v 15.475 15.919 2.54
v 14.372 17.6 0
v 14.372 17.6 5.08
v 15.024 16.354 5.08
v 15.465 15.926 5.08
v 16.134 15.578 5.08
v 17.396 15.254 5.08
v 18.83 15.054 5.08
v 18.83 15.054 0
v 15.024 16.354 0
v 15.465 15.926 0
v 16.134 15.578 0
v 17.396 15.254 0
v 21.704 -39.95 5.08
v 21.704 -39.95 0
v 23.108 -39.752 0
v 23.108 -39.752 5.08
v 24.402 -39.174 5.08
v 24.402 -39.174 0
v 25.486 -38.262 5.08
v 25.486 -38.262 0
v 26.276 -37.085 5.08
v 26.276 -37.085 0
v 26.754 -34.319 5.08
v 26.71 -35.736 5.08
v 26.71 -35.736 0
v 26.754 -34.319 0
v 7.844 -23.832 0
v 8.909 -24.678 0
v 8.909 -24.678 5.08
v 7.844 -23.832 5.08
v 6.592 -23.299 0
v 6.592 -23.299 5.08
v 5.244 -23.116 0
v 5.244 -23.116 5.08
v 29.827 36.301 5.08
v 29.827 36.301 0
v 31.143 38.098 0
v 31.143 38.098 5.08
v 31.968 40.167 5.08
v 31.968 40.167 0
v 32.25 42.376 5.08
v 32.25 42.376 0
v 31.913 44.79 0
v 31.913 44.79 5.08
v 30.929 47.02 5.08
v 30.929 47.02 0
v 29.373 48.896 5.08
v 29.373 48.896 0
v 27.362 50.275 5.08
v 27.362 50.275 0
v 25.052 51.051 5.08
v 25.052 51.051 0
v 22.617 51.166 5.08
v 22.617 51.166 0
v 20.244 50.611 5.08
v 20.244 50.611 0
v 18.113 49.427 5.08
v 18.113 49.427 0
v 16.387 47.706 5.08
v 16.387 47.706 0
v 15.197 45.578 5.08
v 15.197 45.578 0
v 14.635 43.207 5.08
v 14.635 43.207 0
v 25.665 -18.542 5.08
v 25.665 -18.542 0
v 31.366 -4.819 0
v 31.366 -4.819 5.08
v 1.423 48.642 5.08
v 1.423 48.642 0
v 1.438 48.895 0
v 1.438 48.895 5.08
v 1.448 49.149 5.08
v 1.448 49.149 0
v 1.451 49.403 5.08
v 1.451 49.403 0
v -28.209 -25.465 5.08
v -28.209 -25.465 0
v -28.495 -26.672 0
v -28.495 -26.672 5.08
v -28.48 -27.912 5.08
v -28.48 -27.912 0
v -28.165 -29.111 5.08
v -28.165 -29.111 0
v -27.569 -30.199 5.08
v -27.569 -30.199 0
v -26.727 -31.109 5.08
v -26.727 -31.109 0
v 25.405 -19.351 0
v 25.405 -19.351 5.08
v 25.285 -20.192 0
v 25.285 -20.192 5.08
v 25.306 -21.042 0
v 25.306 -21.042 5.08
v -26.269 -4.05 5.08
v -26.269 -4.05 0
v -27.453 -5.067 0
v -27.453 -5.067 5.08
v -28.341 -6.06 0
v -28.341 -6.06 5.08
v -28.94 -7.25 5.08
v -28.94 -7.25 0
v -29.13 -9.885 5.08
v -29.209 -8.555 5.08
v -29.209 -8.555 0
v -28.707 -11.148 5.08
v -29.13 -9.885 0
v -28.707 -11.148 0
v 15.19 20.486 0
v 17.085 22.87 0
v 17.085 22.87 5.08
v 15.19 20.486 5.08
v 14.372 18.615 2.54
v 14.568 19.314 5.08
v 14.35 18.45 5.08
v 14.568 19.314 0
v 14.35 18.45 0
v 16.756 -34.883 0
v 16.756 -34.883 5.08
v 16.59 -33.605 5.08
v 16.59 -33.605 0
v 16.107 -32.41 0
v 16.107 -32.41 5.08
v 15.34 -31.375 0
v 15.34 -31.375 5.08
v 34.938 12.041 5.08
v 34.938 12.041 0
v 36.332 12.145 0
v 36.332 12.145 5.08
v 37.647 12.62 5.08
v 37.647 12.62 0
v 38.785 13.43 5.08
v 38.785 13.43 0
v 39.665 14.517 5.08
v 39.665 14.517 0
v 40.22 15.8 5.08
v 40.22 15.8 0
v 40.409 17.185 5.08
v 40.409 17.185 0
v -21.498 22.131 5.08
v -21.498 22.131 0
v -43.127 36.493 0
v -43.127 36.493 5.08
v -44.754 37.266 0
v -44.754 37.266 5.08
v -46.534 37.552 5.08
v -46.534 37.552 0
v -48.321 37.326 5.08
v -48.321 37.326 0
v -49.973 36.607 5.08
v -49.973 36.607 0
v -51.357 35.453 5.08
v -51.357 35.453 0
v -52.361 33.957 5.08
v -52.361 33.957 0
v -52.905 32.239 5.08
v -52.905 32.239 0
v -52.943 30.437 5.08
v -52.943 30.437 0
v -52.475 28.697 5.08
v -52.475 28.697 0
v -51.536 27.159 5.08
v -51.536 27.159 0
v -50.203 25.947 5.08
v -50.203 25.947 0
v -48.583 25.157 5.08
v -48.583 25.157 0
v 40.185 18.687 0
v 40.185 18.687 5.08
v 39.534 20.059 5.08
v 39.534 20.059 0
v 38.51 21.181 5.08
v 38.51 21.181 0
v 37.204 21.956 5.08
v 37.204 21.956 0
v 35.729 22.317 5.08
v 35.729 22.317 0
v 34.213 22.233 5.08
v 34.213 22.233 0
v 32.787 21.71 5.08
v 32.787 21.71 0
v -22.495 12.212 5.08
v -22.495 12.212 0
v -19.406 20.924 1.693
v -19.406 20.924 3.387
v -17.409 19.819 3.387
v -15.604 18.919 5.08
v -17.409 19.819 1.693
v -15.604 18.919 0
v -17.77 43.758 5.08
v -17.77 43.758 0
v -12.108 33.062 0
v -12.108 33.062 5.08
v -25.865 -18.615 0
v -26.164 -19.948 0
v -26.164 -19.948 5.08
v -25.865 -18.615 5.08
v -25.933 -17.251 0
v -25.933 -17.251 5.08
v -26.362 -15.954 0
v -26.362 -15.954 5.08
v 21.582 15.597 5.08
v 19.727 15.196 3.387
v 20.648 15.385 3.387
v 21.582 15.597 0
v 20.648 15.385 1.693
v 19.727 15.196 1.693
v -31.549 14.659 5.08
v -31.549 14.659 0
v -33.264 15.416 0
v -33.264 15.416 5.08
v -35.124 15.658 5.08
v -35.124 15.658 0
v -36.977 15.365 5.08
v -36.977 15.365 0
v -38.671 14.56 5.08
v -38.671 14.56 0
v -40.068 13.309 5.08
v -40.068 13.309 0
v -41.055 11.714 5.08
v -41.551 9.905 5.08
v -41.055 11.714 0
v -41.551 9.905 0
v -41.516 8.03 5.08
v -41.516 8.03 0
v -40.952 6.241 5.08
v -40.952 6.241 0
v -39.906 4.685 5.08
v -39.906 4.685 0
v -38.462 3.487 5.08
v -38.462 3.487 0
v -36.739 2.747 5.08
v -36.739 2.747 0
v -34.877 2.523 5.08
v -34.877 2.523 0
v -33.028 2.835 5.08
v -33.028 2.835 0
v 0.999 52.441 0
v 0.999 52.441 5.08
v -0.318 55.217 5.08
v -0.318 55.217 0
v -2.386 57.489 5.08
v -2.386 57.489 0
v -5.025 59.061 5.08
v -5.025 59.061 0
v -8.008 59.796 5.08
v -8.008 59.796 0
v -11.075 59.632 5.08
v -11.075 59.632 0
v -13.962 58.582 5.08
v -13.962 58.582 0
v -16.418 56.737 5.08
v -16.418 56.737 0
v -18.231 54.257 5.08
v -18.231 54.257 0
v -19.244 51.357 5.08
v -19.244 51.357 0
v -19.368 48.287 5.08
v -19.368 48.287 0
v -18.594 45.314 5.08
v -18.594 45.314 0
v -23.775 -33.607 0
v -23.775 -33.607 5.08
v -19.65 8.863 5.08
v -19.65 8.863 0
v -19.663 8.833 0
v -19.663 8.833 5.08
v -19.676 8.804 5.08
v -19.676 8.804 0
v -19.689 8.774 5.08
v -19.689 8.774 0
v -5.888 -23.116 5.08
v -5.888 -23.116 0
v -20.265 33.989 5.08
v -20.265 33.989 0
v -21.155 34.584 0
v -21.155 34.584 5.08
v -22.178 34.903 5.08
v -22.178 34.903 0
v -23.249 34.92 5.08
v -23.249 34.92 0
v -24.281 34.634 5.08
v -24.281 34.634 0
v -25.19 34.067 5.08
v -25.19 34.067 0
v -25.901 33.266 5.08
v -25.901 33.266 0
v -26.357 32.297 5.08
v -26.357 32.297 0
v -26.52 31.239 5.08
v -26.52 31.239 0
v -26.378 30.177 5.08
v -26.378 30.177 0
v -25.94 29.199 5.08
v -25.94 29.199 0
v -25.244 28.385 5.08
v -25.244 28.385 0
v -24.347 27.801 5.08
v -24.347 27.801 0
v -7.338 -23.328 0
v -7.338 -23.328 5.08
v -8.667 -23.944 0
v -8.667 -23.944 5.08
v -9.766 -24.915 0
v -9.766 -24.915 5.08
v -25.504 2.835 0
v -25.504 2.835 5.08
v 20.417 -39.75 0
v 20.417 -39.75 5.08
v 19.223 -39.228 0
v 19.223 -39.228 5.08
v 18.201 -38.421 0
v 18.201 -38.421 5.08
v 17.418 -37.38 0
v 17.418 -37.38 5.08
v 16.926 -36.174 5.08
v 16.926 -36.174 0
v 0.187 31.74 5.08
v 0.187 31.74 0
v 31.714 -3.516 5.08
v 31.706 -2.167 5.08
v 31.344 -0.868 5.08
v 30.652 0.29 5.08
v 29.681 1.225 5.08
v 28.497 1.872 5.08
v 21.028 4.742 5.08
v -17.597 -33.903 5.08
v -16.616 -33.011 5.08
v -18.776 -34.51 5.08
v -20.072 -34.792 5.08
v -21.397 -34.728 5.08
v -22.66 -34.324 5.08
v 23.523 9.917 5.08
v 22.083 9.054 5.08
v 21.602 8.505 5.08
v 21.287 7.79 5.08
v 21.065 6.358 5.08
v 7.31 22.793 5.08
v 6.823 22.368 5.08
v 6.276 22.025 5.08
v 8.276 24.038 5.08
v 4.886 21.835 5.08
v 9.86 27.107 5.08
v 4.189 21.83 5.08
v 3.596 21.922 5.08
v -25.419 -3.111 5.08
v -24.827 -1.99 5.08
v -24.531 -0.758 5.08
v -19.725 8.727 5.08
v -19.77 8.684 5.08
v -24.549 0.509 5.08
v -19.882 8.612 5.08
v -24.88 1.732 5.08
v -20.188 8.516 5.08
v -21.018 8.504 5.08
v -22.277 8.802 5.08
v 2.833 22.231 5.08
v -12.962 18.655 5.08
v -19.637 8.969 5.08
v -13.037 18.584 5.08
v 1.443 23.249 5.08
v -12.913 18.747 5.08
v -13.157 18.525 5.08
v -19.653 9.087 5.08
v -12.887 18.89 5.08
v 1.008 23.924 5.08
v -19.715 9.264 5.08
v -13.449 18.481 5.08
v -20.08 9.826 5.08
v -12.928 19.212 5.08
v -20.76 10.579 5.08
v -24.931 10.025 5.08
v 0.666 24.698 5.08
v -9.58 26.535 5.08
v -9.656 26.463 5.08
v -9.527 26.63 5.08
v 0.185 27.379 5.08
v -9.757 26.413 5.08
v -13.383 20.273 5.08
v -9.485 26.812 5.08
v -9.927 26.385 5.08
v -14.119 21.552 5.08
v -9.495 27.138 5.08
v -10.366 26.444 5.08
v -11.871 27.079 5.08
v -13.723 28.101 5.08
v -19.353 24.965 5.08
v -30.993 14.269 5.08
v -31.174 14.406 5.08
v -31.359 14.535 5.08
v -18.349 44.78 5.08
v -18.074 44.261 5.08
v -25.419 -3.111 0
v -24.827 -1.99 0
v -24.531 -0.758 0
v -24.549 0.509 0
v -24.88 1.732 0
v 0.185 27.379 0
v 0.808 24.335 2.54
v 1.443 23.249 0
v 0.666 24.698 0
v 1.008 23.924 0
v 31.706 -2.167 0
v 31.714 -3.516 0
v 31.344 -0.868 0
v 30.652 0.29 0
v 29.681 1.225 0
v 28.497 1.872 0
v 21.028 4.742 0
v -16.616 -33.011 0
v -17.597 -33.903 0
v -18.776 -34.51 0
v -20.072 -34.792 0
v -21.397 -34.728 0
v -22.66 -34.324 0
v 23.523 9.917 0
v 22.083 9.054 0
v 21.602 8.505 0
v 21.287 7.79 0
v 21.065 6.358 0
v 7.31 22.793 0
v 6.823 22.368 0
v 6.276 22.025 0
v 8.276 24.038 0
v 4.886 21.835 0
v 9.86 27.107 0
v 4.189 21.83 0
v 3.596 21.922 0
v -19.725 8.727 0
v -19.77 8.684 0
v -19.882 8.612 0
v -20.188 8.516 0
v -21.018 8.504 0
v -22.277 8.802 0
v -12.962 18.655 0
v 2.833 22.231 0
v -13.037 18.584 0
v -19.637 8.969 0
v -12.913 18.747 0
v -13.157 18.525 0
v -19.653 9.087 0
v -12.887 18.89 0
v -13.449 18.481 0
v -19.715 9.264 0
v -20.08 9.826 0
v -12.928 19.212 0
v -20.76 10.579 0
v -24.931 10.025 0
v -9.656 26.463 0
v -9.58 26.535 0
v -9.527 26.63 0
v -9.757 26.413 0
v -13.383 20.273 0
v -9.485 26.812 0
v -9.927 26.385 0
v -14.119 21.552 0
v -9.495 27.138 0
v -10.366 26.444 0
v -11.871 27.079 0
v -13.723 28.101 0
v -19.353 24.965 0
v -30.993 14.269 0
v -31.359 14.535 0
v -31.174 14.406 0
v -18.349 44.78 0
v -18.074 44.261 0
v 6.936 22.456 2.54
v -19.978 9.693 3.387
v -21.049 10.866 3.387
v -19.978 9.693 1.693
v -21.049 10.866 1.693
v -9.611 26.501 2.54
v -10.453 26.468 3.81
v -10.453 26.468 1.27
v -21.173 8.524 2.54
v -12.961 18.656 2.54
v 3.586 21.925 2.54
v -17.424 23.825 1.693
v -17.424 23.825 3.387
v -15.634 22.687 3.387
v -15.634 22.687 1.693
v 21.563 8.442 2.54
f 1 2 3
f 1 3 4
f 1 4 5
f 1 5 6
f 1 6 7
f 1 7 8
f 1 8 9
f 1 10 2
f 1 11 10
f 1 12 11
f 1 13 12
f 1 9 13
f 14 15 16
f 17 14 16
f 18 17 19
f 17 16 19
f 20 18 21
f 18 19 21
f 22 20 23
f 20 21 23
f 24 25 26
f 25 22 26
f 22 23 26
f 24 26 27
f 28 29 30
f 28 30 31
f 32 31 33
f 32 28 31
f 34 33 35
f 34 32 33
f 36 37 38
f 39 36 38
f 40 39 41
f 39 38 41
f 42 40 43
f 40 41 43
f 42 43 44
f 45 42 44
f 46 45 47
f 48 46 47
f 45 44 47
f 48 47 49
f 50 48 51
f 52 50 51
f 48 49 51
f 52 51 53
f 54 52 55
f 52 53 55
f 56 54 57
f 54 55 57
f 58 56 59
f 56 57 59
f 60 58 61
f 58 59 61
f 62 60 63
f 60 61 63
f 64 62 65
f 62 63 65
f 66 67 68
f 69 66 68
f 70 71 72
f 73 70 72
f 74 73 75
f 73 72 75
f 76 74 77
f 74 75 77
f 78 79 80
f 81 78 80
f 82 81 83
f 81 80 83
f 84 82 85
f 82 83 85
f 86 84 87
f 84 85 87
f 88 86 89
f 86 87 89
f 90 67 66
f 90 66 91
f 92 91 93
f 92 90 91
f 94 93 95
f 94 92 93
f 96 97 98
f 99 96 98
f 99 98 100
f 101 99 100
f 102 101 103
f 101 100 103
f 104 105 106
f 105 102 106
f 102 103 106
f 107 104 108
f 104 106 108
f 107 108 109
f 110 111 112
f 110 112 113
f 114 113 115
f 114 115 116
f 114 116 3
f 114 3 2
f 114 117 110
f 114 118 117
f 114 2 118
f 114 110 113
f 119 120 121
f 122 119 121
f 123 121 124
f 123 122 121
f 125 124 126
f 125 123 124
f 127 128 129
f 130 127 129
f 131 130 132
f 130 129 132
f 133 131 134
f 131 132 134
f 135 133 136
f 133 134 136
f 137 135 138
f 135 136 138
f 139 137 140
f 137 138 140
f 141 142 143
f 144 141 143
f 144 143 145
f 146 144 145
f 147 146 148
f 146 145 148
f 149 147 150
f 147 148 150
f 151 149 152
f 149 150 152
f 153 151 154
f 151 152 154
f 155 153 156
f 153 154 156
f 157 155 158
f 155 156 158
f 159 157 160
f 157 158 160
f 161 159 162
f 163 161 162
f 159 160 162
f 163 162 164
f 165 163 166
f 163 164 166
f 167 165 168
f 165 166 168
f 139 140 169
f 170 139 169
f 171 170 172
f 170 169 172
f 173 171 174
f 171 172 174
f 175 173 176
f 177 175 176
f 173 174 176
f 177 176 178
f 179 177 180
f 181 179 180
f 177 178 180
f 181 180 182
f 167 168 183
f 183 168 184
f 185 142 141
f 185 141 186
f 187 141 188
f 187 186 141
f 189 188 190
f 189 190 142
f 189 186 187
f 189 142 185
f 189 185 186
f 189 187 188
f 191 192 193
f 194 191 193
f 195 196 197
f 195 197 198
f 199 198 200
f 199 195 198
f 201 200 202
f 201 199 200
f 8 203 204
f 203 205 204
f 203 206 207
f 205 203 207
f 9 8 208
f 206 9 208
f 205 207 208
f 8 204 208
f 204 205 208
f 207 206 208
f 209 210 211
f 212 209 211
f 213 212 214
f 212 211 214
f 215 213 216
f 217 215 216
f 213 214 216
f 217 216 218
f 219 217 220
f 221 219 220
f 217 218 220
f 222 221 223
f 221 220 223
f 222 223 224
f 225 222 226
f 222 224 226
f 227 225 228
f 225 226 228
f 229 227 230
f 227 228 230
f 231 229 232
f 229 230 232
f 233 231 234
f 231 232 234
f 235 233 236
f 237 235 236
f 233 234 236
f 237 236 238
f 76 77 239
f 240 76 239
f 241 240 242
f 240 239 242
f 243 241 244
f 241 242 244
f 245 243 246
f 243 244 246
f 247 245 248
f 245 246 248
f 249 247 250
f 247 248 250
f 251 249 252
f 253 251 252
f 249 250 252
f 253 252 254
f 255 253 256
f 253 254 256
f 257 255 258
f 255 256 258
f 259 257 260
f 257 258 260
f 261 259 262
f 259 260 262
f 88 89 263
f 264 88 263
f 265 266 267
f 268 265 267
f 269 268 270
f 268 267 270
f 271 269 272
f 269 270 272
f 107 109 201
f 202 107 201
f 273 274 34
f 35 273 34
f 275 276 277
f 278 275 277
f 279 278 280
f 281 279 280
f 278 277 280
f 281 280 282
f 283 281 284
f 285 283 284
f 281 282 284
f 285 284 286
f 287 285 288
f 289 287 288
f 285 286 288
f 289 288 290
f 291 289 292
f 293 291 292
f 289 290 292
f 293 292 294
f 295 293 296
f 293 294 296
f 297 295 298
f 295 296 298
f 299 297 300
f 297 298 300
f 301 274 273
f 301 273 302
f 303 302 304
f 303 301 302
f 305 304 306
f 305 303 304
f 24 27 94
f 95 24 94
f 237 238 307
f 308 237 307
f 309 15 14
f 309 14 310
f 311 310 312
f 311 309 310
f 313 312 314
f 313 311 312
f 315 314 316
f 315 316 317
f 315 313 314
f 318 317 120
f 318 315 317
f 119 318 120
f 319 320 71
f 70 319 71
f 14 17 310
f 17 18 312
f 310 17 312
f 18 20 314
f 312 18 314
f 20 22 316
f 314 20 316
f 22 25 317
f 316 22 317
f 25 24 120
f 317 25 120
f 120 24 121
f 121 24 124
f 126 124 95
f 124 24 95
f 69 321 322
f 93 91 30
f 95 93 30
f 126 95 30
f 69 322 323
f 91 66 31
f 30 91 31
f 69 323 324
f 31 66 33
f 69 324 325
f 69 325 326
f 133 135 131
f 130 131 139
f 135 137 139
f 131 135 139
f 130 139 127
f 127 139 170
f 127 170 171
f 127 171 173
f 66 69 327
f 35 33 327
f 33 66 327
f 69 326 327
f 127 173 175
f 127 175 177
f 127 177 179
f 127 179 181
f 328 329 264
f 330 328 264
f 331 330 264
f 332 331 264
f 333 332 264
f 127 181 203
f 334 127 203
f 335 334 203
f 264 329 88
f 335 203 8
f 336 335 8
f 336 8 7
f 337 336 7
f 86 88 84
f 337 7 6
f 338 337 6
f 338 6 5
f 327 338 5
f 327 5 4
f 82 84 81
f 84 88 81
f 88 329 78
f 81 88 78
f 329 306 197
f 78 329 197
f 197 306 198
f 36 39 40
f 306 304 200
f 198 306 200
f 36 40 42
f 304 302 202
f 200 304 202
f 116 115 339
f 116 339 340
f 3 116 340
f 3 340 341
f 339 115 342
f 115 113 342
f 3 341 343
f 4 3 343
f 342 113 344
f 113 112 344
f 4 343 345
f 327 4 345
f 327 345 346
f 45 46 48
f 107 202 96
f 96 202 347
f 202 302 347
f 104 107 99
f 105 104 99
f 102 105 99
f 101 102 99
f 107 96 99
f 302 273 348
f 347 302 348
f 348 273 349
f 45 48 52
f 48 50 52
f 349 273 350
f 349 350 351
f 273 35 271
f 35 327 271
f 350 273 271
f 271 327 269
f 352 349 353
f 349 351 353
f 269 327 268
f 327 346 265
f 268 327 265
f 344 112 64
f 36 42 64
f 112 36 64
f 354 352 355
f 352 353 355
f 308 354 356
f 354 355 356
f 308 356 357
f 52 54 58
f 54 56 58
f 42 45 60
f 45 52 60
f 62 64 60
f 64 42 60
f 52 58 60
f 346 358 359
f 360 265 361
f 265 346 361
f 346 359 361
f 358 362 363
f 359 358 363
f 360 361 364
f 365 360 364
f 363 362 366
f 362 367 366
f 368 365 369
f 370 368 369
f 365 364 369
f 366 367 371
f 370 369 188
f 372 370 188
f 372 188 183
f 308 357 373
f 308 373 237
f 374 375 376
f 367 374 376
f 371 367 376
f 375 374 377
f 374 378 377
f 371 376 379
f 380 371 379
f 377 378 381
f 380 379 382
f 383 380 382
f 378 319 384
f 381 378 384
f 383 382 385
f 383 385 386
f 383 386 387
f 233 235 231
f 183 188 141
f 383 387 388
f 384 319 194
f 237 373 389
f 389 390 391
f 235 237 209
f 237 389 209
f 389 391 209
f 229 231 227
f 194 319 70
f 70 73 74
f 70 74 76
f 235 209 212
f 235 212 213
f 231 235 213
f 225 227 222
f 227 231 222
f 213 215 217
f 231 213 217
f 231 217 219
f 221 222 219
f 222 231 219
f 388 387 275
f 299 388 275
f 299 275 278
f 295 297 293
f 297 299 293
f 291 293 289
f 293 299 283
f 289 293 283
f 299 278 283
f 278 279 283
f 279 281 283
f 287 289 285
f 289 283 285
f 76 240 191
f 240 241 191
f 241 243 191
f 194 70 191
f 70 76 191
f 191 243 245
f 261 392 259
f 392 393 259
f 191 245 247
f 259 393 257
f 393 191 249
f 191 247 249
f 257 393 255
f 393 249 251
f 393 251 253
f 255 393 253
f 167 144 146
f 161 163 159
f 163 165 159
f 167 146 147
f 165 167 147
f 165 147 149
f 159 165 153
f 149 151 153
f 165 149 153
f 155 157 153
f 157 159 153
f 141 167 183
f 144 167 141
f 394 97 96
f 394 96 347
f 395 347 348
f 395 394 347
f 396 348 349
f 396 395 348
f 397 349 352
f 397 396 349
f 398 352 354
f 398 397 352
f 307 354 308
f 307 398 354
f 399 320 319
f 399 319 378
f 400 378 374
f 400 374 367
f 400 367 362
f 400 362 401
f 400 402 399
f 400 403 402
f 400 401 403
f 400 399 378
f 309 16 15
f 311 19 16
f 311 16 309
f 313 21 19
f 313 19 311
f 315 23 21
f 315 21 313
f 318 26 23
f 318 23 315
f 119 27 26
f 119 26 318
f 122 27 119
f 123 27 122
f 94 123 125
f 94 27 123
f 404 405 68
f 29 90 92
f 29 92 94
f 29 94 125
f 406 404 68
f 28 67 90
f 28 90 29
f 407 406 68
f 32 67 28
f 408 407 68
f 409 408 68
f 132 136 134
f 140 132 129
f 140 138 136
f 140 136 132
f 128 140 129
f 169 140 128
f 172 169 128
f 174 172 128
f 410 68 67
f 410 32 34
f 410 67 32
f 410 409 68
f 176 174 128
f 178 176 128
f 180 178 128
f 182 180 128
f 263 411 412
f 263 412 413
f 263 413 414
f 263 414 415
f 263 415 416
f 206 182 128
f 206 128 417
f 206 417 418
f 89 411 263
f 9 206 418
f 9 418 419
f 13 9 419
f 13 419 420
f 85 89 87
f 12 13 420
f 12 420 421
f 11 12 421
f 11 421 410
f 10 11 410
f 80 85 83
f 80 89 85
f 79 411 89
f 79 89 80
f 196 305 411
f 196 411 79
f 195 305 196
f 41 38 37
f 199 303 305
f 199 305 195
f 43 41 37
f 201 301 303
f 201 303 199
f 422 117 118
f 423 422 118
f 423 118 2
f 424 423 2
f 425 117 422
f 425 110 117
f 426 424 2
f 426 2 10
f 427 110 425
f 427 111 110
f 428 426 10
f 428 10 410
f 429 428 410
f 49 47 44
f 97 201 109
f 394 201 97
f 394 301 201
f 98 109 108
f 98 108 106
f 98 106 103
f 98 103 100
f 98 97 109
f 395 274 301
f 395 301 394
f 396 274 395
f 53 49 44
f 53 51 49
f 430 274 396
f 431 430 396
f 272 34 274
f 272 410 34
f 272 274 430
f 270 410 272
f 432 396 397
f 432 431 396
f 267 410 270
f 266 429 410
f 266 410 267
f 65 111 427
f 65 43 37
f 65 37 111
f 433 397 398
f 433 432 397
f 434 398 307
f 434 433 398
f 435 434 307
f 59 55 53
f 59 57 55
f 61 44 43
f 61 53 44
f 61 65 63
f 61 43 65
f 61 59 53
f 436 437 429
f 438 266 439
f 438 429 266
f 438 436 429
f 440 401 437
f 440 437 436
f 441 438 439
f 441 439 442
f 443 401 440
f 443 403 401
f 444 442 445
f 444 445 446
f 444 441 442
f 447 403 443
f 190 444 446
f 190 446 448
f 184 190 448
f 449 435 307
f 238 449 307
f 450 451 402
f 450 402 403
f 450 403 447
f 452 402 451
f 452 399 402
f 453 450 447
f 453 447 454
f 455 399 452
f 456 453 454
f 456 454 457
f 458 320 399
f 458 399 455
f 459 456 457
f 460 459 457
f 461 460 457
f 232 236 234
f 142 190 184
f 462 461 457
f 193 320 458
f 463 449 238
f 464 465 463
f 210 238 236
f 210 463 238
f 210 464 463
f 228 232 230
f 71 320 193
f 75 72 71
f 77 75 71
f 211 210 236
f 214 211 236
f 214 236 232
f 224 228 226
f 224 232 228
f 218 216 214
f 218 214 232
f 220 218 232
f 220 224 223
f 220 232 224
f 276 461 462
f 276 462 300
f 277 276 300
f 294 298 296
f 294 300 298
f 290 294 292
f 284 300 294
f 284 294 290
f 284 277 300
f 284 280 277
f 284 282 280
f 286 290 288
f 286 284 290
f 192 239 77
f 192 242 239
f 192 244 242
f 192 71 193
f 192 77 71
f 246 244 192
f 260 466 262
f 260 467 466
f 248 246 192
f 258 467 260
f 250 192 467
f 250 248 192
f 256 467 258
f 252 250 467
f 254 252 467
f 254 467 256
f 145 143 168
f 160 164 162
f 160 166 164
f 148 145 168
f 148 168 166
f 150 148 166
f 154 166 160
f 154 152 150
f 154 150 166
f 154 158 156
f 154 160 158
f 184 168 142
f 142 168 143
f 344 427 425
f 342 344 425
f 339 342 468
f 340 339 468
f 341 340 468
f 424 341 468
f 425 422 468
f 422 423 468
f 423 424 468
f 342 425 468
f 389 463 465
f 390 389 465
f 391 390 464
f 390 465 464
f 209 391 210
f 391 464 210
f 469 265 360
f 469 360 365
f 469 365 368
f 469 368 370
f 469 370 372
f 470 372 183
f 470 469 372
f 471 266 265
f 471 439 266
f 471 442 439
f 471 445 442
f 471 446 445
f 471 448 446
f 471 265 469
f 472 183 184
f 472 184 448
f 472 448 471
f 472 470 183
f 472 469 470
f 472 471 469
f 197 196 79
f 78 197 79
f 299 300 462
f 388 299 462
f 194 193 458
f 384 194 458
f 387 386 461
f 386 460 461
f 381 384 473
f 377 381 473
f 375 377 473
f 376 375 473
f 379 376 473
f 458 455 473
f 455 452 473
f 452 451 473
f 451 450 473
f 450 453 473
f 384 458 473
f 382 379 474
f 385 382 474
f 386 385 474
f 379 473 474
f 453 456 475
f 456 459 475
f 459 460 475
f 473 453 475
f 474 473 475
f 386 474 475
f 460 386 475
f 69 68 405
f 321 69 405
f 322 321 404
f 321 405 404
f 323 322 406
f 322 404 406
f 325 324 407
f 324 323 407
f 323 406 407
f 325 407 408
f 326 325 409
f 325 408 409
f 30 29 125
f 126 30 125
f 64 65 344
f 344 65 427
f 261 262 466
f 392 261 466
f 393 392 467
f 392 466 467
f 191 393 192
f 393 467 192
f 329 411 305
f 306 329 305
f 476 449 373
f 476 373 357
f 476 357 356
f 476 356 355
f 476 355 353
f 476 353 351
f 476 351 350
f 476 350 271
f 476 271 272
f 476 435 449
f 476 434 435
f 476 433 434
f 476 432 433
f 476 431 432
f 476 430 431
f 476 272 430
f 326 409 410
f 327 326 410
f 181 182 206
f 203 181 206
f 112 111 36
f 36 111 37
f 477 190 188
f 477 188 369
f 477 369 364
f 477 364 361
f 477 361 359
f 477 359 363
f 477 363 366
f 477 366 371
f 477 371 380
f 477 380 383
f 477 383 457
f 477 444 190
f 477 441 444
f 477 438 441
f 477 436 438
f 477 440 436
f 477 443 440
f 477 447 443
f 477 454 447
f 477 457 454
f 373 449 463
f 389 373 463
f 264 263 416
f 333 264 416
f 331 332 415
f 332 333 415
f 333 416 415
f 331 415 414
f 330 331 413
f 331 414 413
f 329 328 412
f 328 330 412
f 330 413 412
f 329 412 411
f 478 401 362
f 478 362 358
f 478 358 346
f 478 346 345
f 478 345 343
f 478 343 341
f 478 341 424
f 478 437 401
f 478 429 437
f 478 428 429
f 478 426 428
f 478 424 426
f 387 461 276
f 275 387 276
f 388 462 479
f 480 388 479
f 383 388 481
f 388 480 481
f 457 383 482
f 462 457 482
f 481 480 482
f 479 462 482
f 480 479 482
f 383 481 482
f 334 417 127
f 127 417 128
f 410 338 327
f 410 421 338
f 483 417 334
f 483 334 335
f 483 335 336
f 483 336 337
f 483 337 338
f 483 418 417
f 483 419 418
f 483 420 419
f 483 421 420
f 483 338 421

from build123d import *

# Parameters (mm, degrees)
F1_DEPTH     = 5.08
F2_T1_DEPTH  = 30.48
F2_T3_DEPTH  = 33.4016018607
F2_T5_DEPTH  = 31.1738532926
F2_T7_DEPTH  = 22.9008851429
F2_T9_DEPTH  = 24.6924150926
F2_T11_DEPTH = 5.08
F3_T1_DEPTH  = 38.5956513


# Not quite as in the source:
# - a fillet or chamfer that OpenCascade refuses, or shapes differently, is made with other operations: its cross-section is extruded or revolved along the edge and cut away or added


with BuildPart() as f1:
    # F0 (on Top) → F1 (new body)
    with BuildSketch(Plane.XY):
        with BuildLine():
            ThreePointArc((-21.5558748819, 0), (0, -21.5558748819), (21.5558748819, 0))
            ThreePointArc((21.5558748819, 0), (21.4234709168, 2.3855053553), (21.0278855675, 4.7417054405))
            ThreePointArc((21.0278855675, 4.7417054405), (20.3885232844, 6.9974181101), (19.5079583491, 9.1703491196))
            ThreePointArc((19.5079583491, 9.1703491196), (18.4039292813, 11.2227950589), (17.0847745632, 13.1440564533))
            ThreePointArc((17.0847745632, 13.1440564533), (16.1728801059, 14.2510943792), (15.1893864462, 15.2950410693))
            ThreePointArc((15.1893864462, 15.2950410693), (13.7642148433, 16.5892173315), (12.2292624666, 17.7510811346))
            ThreePointArc((12.2292624666, 17.7510811346), (10.0743632522, 19.0568346529), (7.7818181976, 20.102214989))
            ThreePointArc((7.7818181976, 20.102214989), (5.7045723263, 20.7873422182), (3.5685890575, 21.2584315993))
            ThreePointArc((3.5685890575, 21.2584315993), (1.5124623044, 21.5027486546), (-0.5576198391, 21.5486612586))
            ThreePointArc((-0.5576198391, 21.5486612586), (-3.1118074322, 21.3300819602), (-5.6219845653, 20.8098301644))
            Line((-5.6219845653, 20.8098301644), (-9.4810400544, 19.3588641561))
            ThreePointArc((-9.4810400544, 19.3588641561), (-10.7139746116, 18.7047183872), (-11.9019916348, 17.972154491))
            ThreePointArc((-11.9019916348, 17.972154491), (-12.7090282155, 17.4108111167), (-13.489631919, 16.81325586))
            Line((-13.489631919, 16.81325586), (-18.8732484452, 10.4142323313))
            ThreePointArc((-18.8732484452, 10.4142323313), (-19.2769960016, 9.6464069518), (-19.6495220596, 8.8629580138))
            add(Edge.make_bspline(
                [(-19.689484951, 8.773820393), (-19.671758168, 8.8014219328), (-19.6583090598, 8.8311154874), (-19.6495220596, 8.8629580138)],
                knots=[0.5880065236, 0.5880065236, 0.5880065236, 0.5880065236, 0.6086967417, 0.6086967417, 0.6086967417, 0.6086967417], degree=3))
            ThreePointArc((-19.689484951, 8.773820393), (-20.0824369178, 7.8327178788), (-20.4304363673, 6.8740826127))
            ThreePointArc((-20.4304363673, 6.8740826127), (-20.9968993757, 4.8770850443), (-21.3686524004, 2.834860934))
            ThreePointArc((-21.3686524004, 2.834860934), (-21.5090183349, 1.4205182833), (-21.5558748819, 0))
        make_face()
        with BuildLine():
            ThreePointArc((21.0278855675, 4.7417054405), (21.4234709168, 2.3855053553), (21.5558748819, 0))
            ThreePointArc((21.5558748819, 0), (0, -21.5558748819), (-21.5558748819, 0))
            Line((-21.5558748819, 0), (-30.4278861731, -7.6231318526))
            Line((-30.4278861731, -7.6231318526), (-25.4074353725, -17.9089326411))
            Line((-25.4074353725, -17.9089326411), (-29.4482856989, -28.8069844246))
            Line((-29.4482856989, -28.8069844246), (-19.897185266, -36.8886850774))
            Line((-19.897185266, -36.8886850774), (-8.2437438999, -23.1164366785))
            Line((-8.2437438999, -23.1164366785), (7.4091665447, -23.1164366785))
            Line((7.4091665447, -23.1164366785), (17.6949668676, -33.8274315))
            Line((17.6949668676, -33.8274315), (15.0010669604, -39.9499349296))
            Line((15.0010669604, -39.9499349296), (27.3685175925, -39.9499349296))
            Line((27.3685175925, -39.9499349296), (25.1644179225, -19.7456832975))
            Line((25.1644179225, -19.7456832975), (33.3685651422, 0))
            Line((33.3685651422, 0), (21.0278855675, 4.7417054405))
        make_face()
        with BuildLine():
            ThreePointArc((19.5079583491, 9.1703491196), (20.3885232844, 6.9974181101), (21.0278855675, 4.7417054405))
            add(Edge.make_bspline(
                [(23.5232420106, 9.9174740822), (22.7559455678, 9.5391724766), (21.0414634986, 8.6938781634), (21.0327174333, 6.1481323969), (21.0278855675, 4.7417054405)],
                knots=[0, 0, 0, 0, 0.4475383305, 1, 1, 1, 1], degree=3))
            Line((23.5232420106, 9.9174740822), (19.5079583491, 9.1703491196))
        make_face()
        with BuildLine():
            add(Edge.make_bspline(
                [(-25.5037302423, 2.834860934), (-24.5160973645, 2.5129693408), (-22.6879107249, 1.9171225202), (-21.9124239812, 0.6038221422), (-21.5558748819, 0)],
                knots=[0, 0, 0, 0, 0.5402254105, 1, 1, 1, 1], degree=3))
            ThreePointArc((-21.5558748819, 0), (-21.5090183349, 1.4205182833), (-21.3686524004, 2.834860934))
            Line((-21.3686524004, 2.834860934), (-25.5037302423, 2.834860934))
        make_face()
        with BuildLine():
            ThreePointArc((17.0847745632, 13.1440564533), (18.4039292813, 11.2227950589), (19.5079583491, 9.1703491196))
            Line((19.5079583491, 9.1703491196), (23.5232420106, 9.9174740822))
            Line((23.5232420106, 9.9174740822), (34.937579099, 12.0413430014))
            ThreePointArc((34.937579099, 12.0413430014), (30.2244051694, 16.0664474688), (32.7872119933, 21.7098060121))
            Line((32.7872119933, 21.7098060121), (21.5822452322, 15.5974467356))
            Line((21.5822452322, 15.5974467356), (21.0278855675, 15.2950410693))
            Line((21.0278855675, 15.2950410693), (17.0847745632, 13.1440564533))
        make_face()
        with BuildLine():
            Line((-25.5037302423, 2.834860934), (-21.3686524004, 2.834860934))
            ThreePointArc((-21.3686524004, 2.834860934), (-20.9968993757, 4.8770850443), (-20.4304363673, 6.8740826127))
            Line((-20.4304363673, 6.8740826127), (-24.9308068167, 10.0250903474))
            Line((-24.9308068167, 10.0250903474), (-30.9927849426, 14.269483154))
            ThreePointArc((-30.9927849426, 14.269483154), (-29.1301786272, 11.9719193672), (-28.4643126696, 9.0901275345))
            ThreePointArc((-28.4643126696, 9.0901275345), (-29.7263545066, 5.2187104583), (-33.0275484153, 2.834860934))
            Line((-33.0275484153, 2.834860934), (-25.5037302423, 2.834860934))
        make_face()
        with BuildLine():
            ThreePointArc((15.1893864462, 15.2950410693), (16.1728801059, 14.2510943792), (17.0847745632, 13.1440564533))
            Line((17.0847745632, 13.1440564533), (21.0278855675, 15.2950410693))
            Line((21.0278855675, 15.2950410693), (21.5822452322, 15.5974467356))
            add(Edge.make_bspline(
                [(21.5822452322, 15.5974467356), (20.6461265257, 15.3814646696), (19.7100078192, 15.1654826036), (18.8297399827, 15.0541492613)],
                knots=[0, 0, 0, 0, 0.3951796339, 0.3951796339, 0.3951796339, 0.3951796339], degree=3))
            add(Edge.make_bspline(
                [(18.8297399827, 15.0541492613), (18.5066864561, 15.0132905279), (17.1908116294, 14.9016748686), (16.0537750645, 15.1251514978), (15.1893864462, 15.2950410693)],
                knots=[0.3951796339, 0.3951796339, 0.3951796339, 0.3951796339, 0.5402084184, 1, 1, 1, 1], degree=3))
        make_face()
        with BuildLine():
            ThreePointArc((32.7872119933, 21.7098060121), (30.2244051694, 16.0664474688), (34.937579099, 12.0413430014))
            ThreePointArc((34.937579099, 12.0413430014), (38.7854990971, 13.4304076429), (40.4091437753, 17.1853732684))
            ThreePointArc((40.4091437753, 17.1853732684), (37.8860736917, 21.6171995213), (32.7872119933, 21.7098060121))
        make_face()
        with BuildLine():
            Line((-24.9308068167, 10.0250903474), (-20.4304363673, 6.8740826127))
            ThreePointArc((-20.4304363673, 6.8740826127), (-20.0824369178, 7.8327178788), (-19.689484951, 8.773820393))
            add(Edge.make_bspline(
                [(-24.9308068167, 10.0250903474), (-23.6422724453, 9.3599481679), (-21.6239700291, 8.3165515966), (-19.8715548677, 8.4903278918), (-19.689484951, 8.773820393)],
                knots=[0, 0, 0, 0, 0.3754994773, 0.5880065236, 0.5880065236, 0.5880065236, 0.5880065236], degree=3))
        make_face()
        with BuildLine():
            ThreePointArc((-31.5485147848, 14.6585864624), (-41.5514457727, 9.9054871575), (-33.0275484153, 2.834860934))
            ThreePointArc((-33.0275484153, 2.834860934), (-29.7263545066, 5.2187104583), (-28.4643126696, 9.0901275345))
            ThreePointArc((-28.4643126696, 9.0901275345), (-29.1301786272, 11.9719193672), (-30.9927849426, 14.269483154))
            Line((-30.9927849426, 14.269483154), (-31.5485147848, 14.6585864624))
        make_face()
        with BuildLine():
            add(Edge.make_bspline(
                [(14.372244753, 17.5998769298), (14.4881018562, 16.8222590075), (14.8387441512, 16.0586500384), (15.1893864462, 15.2950410693)],
                knots=[0.6845639483, 0.6845639483, 0.6845639483, 0.6845639483, 1, 1, 1, 1], degree=3))
            add(Edge.make_bspline(
                [(18.8297399827, 15.0541492613), (18.5066864561, 15.0132905279), (17.1908116294, 14.9016748686), (16.0537750645, 15.1251514978), (15.1893864462, 15.2950410693)],
                knots=[0.3951796339, 0.3951796339, 0.3951796339, 0.3951796339, 0.5402084184, 1, 1, 1, 1], degree=3))
            add(Edge.make_bspline(
                [(14.372244753, 17.5998769298), (14.6351603968, 16.9655355449), (15.2435298304, 15.5008816531), (17.5314333381, 15.2122461299), (18.8297399827, 15.0541492613)],
                knots=[0, 0, 0, 0, 0.4324268759, 1, 1, 1, 1], degree=3))
        make_face()
        with BuildLine():
            ThreePointArc((12.2292624666, 17.7510811346), (13.7642148433, 16.5892173315), (15.1893864462, 15.2950410693))
            add(Edge.make_bspline(
                [(14.372244753, 17.5998769298), (14.4881018562, 16.8222590075), (14.8387441512, 16.0586500384), (15.1893864462, 15.2950410693)],
                knots=[0.6845639483, 0.6845639483, 0.6845639483, 0.6845639483, 1, 1, 1, 1], degree=3))
            add(Edge.make_bspline(
                [(17.0847745632, 22.8695263715), (15.8418994446, 21.4312290193), (14.2906498457, 19.6360702318), (14.3222617771, 17.9353562123), (14.372244753, 17.5998769298)],
                knots=[0, 0, 0, 0, 0.548478787, 0.6845639483, 0.6845639483, 0.6845639483, 0.6845639483], degree=3))
            Line((17.0847745632, 22.8695263715), (12.2292624666, 17.7510811346))
        make_face()
        with BuildLine():
            ThreePointArc((-19.6495220596, 8.8629580138), (-19.6695539991, 8.8184118412), (-19.689484951, 8.773820393))
            add(Edge.make_bspline(
                [(-19.689484951, 8.773820393), (-19.671758168, 8.8014219328), (-19.6583090598, 8.8311154874), (-19.6495220596, 8.8629580138)],
                knots=[0.5880065236, 0.5880065236, 0.5880065236, 0.5880065236, 0.6086967417, 0.6086967417, 0.6086967417, 0.6086967417], degree=3))
        make_face()
        with BuildLine():
            ThreePointArc((-30.9927849426, 14.269483154), (-31.2656234469, 14.4712136982), (-31.5485147848, 14.6585864624))
            Line((-31.5485147848, 14.6585864624), (-30.9927849426, 14.269483154))
        make_face()
        with BuildLine():
            ThreePointArc((7.7818181976, 20.102214989), (10.0743632522, 19.0568346529), (12.2292624666, 17.7510811346))
            Line((12.2292624666, 17.7510811346), (17.0847745632, 22.8695263715))
            Line((17.0847745632, 22.8695263715), (29.8265086684, 36.3012441684))
            ThreePointArc((29.8265086684, 36.3012441684), (19.7700953097, 34.3405012918), (14.6350970936, 43.2066027795))
            Line((14.6350970936, 43.2066027795), (9.8595311749, 27.1067871176))
            Line((9.8595311749, 27.1067871176), (7.7818181976, 20.102214989))
        make_face()
        with BuildLine():
            add(Edge.make_bspline(
                [(-19.6495220596, 8.8629580138), (-19.4833381268, 9.4651790358), (-20.9847051533, 10.8360480358), (-22.495258138, 12.2115954812)],
                knots=[0.6086967417, 0.6086967417, 0.6086967417, 0.6086967417, 1, 1, 1, 1], degree=3))
            ThreePointArc((-19.6495220596, 8.8629580138), (-19.2769960016, 9.6464069518), (-18.8732484452, 10.4142323313))
            Line((-18.8732484452, 10.4142323313), (-22.495258138, 12.2115954812))
        make_face()
        with BuildLine():
            ThreePointArc((3.5685890575, 21.2584315993), (5.7045723263, 20.7873422182), (7.7818181976, 20.102214989))
            Line((7.7818181976, 20.102214989), (9.8595311749, 27.1067871176))
            add(Edge.make_bspline(
                [(9.8595311749, 27.1067871176), (9.0003739191, 25.2647119406), (7.9917320333, 23.0991990151), (6.5049700197, 22.1455177099), (6.2757189942, 22.0247046239)],
                knots=[0, 0, 0, 0, 0.553515968, 0.6501455724, 0.6501455724, 0.6501455724, 0.6501455724], degree=3))
            add(Edge.make_bspline(
                [(6.2757189942, 22.0247046239), (5.4456991801, 21.5872921634), (4.5071787847, 21.424245643), (3.5685890575, 21.2584315993)],
                knots=[0.6501455724, 0.6501455724, 0.6501455724, 0.6501455724, 1, 1, 1, 1], degree=3))
        make_face()
        with BuildLine():
            Line((-22.495258138, 12.2115954812), (-18.8732484452, 10.4142323313))
            ThreePointArc((-18.8732484452, 10.4142323313), (-16.49472285, 13.8773145827), (-13.489631919, 16.81325586))
            Line((-13.489631919, 16.81325586), (-21.4981341047, 22.1309257933))
            Line((-21.4981341047, 22.1309257933), (-43.1270560205, 36.4925960649))
            ThreePointArc((-43.1270560205, 36.4925960649), (-41.0437760026, 34.2040473217), (-40.2896412796, 31.2025823789))
            ThreePointArc((-40.2896412796, 31.2025823789), (-42.8993068164, 26.0710720648), (-48.5833099737, 25.1573650952))
            Line((-48.5833099737, 25.1573650952), (-22.495258138, 12.2115954812))
        make_face()
        with BuildLine():
            add(Edge.make_bspline(
                [(1.4428020951, 23.2494519066), (2.0356785994, 22.4625958954), (2.8021338285, 21.8605137474), (3.5685890575, 21.2584315993)],
                knots=[0.6978886874, 0.6978886874, 0.6978886874, 0.6978886874, 1, 1, 1, 1], degree=3))
            add(Edge.make_bspline(
                [(6.2757189942, 22.0247046239), (5.4456991801, 21.5872921634), (4.5071787847, 21.424245643), (3.5685890575, 21.2584315993)],
                knots=[0.6501455724, 0.6501455724, 0.6501455724, 0.6501455724, 1, 1, 1, 1], degree=3))
            add(Edge.make_bspline(
                [(1.4428020951, 23.2494519066), (2.1136741264, 22.6899001143), (3.4684392223, 21.5687785752), (5.3321614448, 21.8612087878), (6.2757189942, 22.0247046239)],
                knots=[0, 0, 0, 0, 0.4858514557, 0.9775111942, 0.9775111942, 0.9775111942, 0.9775111942], degree=3))
        make_face()
        with BuildLine():
            ThreePointArc((-0.5576198391, 21.5486612586), (1.5124623044, 21.5027486546), (3.5685890575, 21.2584315993))
            add(Edge.make_bspline(
                [(1.4428020951, 23.2494519066), (2.0356785994, 22.4625958954), (2.8021338285, 21.8605137474), (3.5685890575, 21.2584315993)],
                knots=[0.6978886874, 0.6978886874, 0.6978886874, 0.6978886874, 1, 1, 1, 1], degree=3))
            add(Edge.make_bspline(
                [(0.1873508122, 31.7397286266), (0.1000880741, 28.9584711756), (-0.0062348151, 25.5697243407), (1.1972842983, 23.5752991157), (1.4428020951, 23.2494519066)],
                knots=[0, 0, 0, 0, 0.5727805016, 0.6978886874, 0.6978886874, 0.6978886874, 0.6978886874], degree=3))
            Line((0.1873508122, 31.7397286266), (-0.5576198391, 21.5486612586))
        make_face()
        with BuildLine():
            ThreePointArc((14.6350970936, 43.2066027795), (19.7700953097, 34.3405012918), (29.8265086684, 36.3012441684))
            ThreePointArc((29.8265086684, 36.3012441684), (31.6214054529, 39.1059647688), (32.2495003028, 42.3760731726))
            ThreePointArc((32.2495003028, 42.3760731726), (23.8384448664, 51.1930593335), (14.6350970936, 43.2066027795))
        make_face()
        with BuildLine():
            Line((-21.4981341047, 22.1309257933), (-13.489631919, 16.81325586))
            ThreePointArc((-13.489631919, 16.81325586), (-12.7090282155, 17.4108111167), (-11.9019916348, 17.972154491))
            add(Edge.make_bspline(
                [(-15.6037653952, 18.9190625193), (-15.1517196516, 18.7132722351), (-13.629732374, 18.0898022553), (-12.6272962109, 18.0215429553), (-11.9019916348, 17.972154491)],
                knots=[0.5064082285, 0.5064082285, 0.5064082285, 0.5064082285, 0.6428656669, 1, 1, 1, 1], degree=3))
            add(Edge.make_bspline(
                [(-21.4981341047, 22.1309257933), (-19.3897449339, 20.9068490942), (-17.2813557631, 19.682772395), (-15.6037653952, 18.9190625193)],
                knots=[0, 0, 0, 0, 0.5064082285, 0.5064082285, 0.5064082285, 0.5064082285], degree=3))
        make_face()
        with BuildLine():
            ThreePointArc((-43.1270560205, 36.4925960649), (-52.3612879028, 33.9567174372), (-48.5833099737, 25.1573650952))
            ThreePointArc((-48.5833099737, 25.1573650952), (-42.8993068164, 26.0710720648), (-40.2896412796, 31.2025823789))
            ThreePointArc((-40.2896412796, 31.2025823789), (-41.0437760026, 34.2040473217), (-43.1270560205, 36.4925960649))
        make_face()
        with BuildLine():
            ThreePointArc((-5.6219845653, 20.8098301644), (-3.1118074322, 21.3300819602), (-0.5576198391, 21.5486612586))
            Line((-0.5576198391, 21.5486612586), (0.1873508122, 31.7397286266))
            Line((0.1873508122, 31.7397286266), (1.4229034066, 48.6418706156))
            ThreePointArc((1.4229034066, 48.6418706156), (-6.4142835546, 39.2859820381), (-17.7701736912, 43.7578842893))
            Line((-17.7701736912, 43.7578842893), (-12.108076115, 33.0621237696))
            Line((-12.108076115, 33.0621237696), (-5.6219845653, 20.8098301644))
        make_face()
        with BuildLine():
            add(Edge.make_bspline(
                [(-14.1186807086, 21.5523049049), (-13.7674127143, 21.2535588061), (-12.528919888, 20.0549599754), (-12.1730615765, 18.869117359), (-11.9019916348, 17.972154491)],
                knots=[0.4851885937, 0.4851885937, 0.4851885937, 0.4851885937, 0.6132384939, 1, 1, 1, 1], degree=3))
            ThreePointArc((-11.9019916348, 17.972154491), (-10.7139746116, 18.7047183872), (-9.4810400544, 19.3588641561))
            Line((-9.4810400544, 19.3588641561), (-19.3532919722, 24.9653740527))
            add(Edge.make_bspline(
                [(-19.3532919722, 24.9653740527), (-17.4010758423, 23.8250906074), (-15.4496557731, 22.6842714218), (-14.1186807086, 21.5523049049)],
                knots=[0, 0, 0, 0, 0.4851885937, 0.4851885937, 0.4851885937, 0.4851885937], degree=3))
        make_face()
        with BuildLine():
            add(Edge.make_bspline(
                [(-15.6037653952, 18.9190625193), (-15.1517196516, 18.7132722351), (-13.629732374, 18.0898022553), (-12.6272962109, 18.0215429553), (-11.9019916348, 17.972154491)],
                knots=[0.5064082285, 0.5064082285, 0.5064082285, 0.5064082285, 0.6428656669, 1, 1, 1, 1], degree=3))
            add(Edge.make_bspline(
                [(-14.1186807086, 21.5523049049), (-13.7674127143, 21.2535588061), (-12.528919888, 20.0549599754), (-12.1730615765, 18.869117359), (-11.9019916348, 17.972154491)],
                knots=[0.4851885937, 0.4851885937, 0.4851885937, 0.4851885937, 0.6132384939, 1, 1, 1, 1], degree=3))
            add(Edge.make_bspline(
                [(-15.6037653952, 18.9190625193), (-14.4283120532, 18.5905868682), (-11.9718187149, 17.9265406092), (-13.3807906918, 20.3143200715), (-14.1186807086, 21.5523049049)],
                knots=[0, 0, 0, 0, 0.4799231847, 1, 1, 1, 1], degree=3))
        make_face()
        with BuildLine():
            ThreePointArc((-9.4810400544, 19.3588641561), (-7.5862812863, 20.1768203186), (-5.6219845653, 20.8098301644))
            Line((-5.6219845653, 20.8098301644), (-13.7229076454, 28.1006093155))
            Line((-13.7229076454, 28.1006093155), (-20.2650786975, 33.9885215741))
            ThreePointArc((-20.2650786975, 33.9885215741), (-19.348532067, 32.7274543218), (-19.0243201626, 31.2025822021))
            ThreePointArc((-19.0243201626, 31.2025822021), (-20.7539962478, 28.0443911329), (-24.3465941192, 27.8010996944))
            Line((-24.3465941192, 27.8010996944), (-19.3532919722, 24.9653740527))
            Line((-19.3532919722, 24.9653740527), (-9.4810400544, 19.3588641561))
        make_face()
        with BuildLine():
            Line((-13.7229076454, 28.1006093155), (-5.6219845653, 20.8098301644))
            Line((-5.6219845653, 20.8098301644), (-12.108076115, 33.0621237696))
            add(Edge.make_bspline(
                [(-12.108076115, 33.0621237696), (-10.5611501023, 30.0773195503), (-7.7878381604, 24.7261953741), (-11.9030987649, 27.065947721), (-13.7229076454, 28.1006093155)],
                knots=[0, 0, 0, 0, 0.5577901243, 1, 1, 1, 1], degree=3))
        make_face()
        with BuildLine():
            ThreePointArc((-17.7701736912, 43.7578842893), (-6.4142835546, 39.2859820381), (1.4229034066, 48.6418706156))
            ThreePointArc((1.4229034066, 48.6418706156), (1.4437368542, 49.022163574), (1.4506844192, 49.4029633877))
            ThreePointArc((1.4506844192, 49.4029633877), (-11.0750760863, 59.6317500163), (-18.5941676648, 45.3144173747))
            Line((-18.5941676648, 45.3144173747), (-17.7701736912, 43.7578842893))
        make_face()
        with BuildLine():
            ThreePointArc((-19.0243201626, 31.2025822021), (-19.348532067, 32.7274543218), (-20.2650786975, 33.9885215741))
            ThreePointArc((-20.2650786975, 33.9885215741), (-25.9011017814, 33.2664173148), (-24.3465941192, 27.8010996944))
            ThreePointArc((-24.3465941192, 27.8010996944), (-20.7539962478, 28.0443911329), (-19.0243201626, 31.2025822021))
        make_face()
        with BuildLine():
            ThreePointArc((-18.5941676648, 45.3144173747), (-18.215053705, 44.5187432893), (-17.7701736912, 43.7578842893))
            Line((-17.7701736912, 43.7578842893), (-18.5941676648, 45.3144173747))
        make_face()
        with BuildLine():
            ThreePointArc((-13.489631919, 16.81325586), (-16.49472285, 13.8773145827), (-18.8732484452, 10.4142323313))
            Line((-18.8732484452, 10.4142323313), (-13.489631919, 16.81325586))
        make_face()
        with BuildLine():
            Line((-9.4810400544, 19.3588641561), (-5.6219845653, 20.8098301644))
            ThreePointArc((-5.6219845653, 20.8098301644), (-7.5862812863, 20.1768203186), (-9.4810400544, 19.3588641561))
        make_face()
    extrude(amount=F1_DEPTH)

    # F2: fillet of radius 5.08 on 11 edges, made by hand

    # F2_s2 → F2_t1 (cut)
    with BuildSketch(Plane.XY.offset(-12.7)):
        with BuildLine():
            ThreePointArc((-23.7751875383, -33.607298423), (-20.0719299347, -34.7917486099), (-16.6157986116, -33.0106828051))
            Line((-16.6157986116, -33.0106828051), (-16.5382385661, -33.0763105382))
            Line((-16.5382385661, -33.0763105382), (-19.8852529537, -37.031872856))
            Line((-19.8852529537, -37.031872856), (-23.8408152714, -33.6848584684))
            Line((-23.8408152714, -33.6848584684), (-23.7751875383, -33.607298423))
        make_face()
    extrude(amount=F2_T1_DEPTH, mode=Mode.SUBTRACT)

    # F2_s4 → F2_t3 (cut)
    with BuildSketch(Plane.XY.offset(-14.1608009303)):
        with BuildLine():
            ThreePointArc((21.7041972204, -39.9499349296), (25.4860644305, -38.2616720075), (26.7542362913, -34.3190217034))
            Line((26.7542362913, -34.3190217034), (26.8552370727, -34.3080034389))
            Line((26.8552370727, -34.3080034389), (27.481804, -40.0515349296))
            Line((27.481804, -40.0515349296), (21.7041972204, -40.0515349296))
            Line((21.7041972204, -40.0515349296), (21.7041972204, -39.9499349296))
        make_face()
    extrude(amount=F2_T3_DEPTH, mode=Mode.SUBTRACT)

    # F2_s6 → F2_t5 (cut)
    with BuildSketch(Plane.XY.offset(-13.0469266463)):
        with BuildLine():
            ThreePointArc((31.3661757916, -4.8193364766), (31.3438624437, -0.8681884219), (28.4970258172, 1.8718097639))
            Line((28.4970258172, 1.8718097639), (28.5334665587, 1.9666497995))
            Line((28.5334665587, 1.9666497995), (33.5024366701, 0.0574038404))
            Line((33.5024366701, 0.0574038404), (31.4599995324, -4.8583193657))
            Line((31.4599995324, -4.8583193657), (31.3661757916, -4.8193364766))
        make_face()
    extrude(amount=F2_T5_DEPTH, mode=Mode.SUBTRACT)

    # F2_s8 → F2_t7 (cut)
    with BuildSketch(Plane.XY.offset(-8.9104425714)):
        with BuildLine():
            ThreePointArc((-28.2091730806, -25.465134965), (-28.3595555101, -28.5211629615), (-26.7274418769, -31.109236971))
            Line((-26.7274418769, -31.109236971), (-26.79306961, -31.1867970164))
            Line((-26.79306961, -31.1867970164), (-29.5683303084, -28.8384994191))
            Line((-29.5683303084, -28.8384994191), (-28.3044354378, -25.4298129704))
            Line((-28.3044354378, -25.4298129704), (-28.2091730806, -25.465134965))
        make_face()
    extrude(amount=F2_T7_DEPTH, mode=Mode.SUBTRACT)

    # F2_s10 → F2_t9 (cut)
    with BuildSketch(Plane.XY.offset(-9.8062075463)):
        with BuildLine():
            ThreePointArc((-27.4527909667, -5.0668295342), (-29.1173620778, -7.8934900279), (-28.7073500706, -11.1481323562))
            Line((-28.7073500706, -11.1481323562), (-28.7986544942, -11.1926976143))
            Line((-28.7986544942, -11.1926976143), (-30.5536013188, -7.5971971006))
            Line((-30.5536013188, -7.5971971006), (-27.5190042082, -4.9897687358))
            Line((-27.5190042082, -4.9897687358), (-27.4527909667, -5.0668295342))
        make_face()
    extrude(amount=F2_T9_DEPTH, mode=Mode.SUBTRACT)

    # F2_s12 → F2_t11 (join)
    with BuildSketch(Plane.XY):
        with BuildLine():
            ThreePointArc((-5.8876452816, -23.1164366785), (-8.0250450799, -23.587974668), (-9.7656475539, -24.915050024))
            Line((-9.7656475539, -24.915050024), (-9.8432075993, -24.8494222909))
            Line((-9.8432075993, -24.8494222909), (-8.2908658722, -23.0148366785))
            Line((-8.2908658722, -23.0148366785), (-5.8876452816, -23.0148366785))
            Line((-5.8876452816, -23.0148366785), (-5.8876452816, -23.1164366785))
        make_face()
        with BuildLine():
            ThreePointArc((8.9085458148, -24.6777973012), (7.2358985953, -23.523049896), (5.2444528939, -23.1164366785))
            Line((5.2444528939, -23.1164366785), (5.2444528939, -23.0148366785))
            Line((5.2444528939, -23.0148366785), (7.4524608177, -23.0148366785))
            Line((7.4524608177, -23.0148366785), (8.9818276732, -24.6074245137))
            Line((8.9818276732, -24.6074245137), (8.9085458148, -24.6777973012))
        make_face()
        with BuildLine():
            ThreePointArc((25.6646602449, -18.5417036265), (25.3273839394, -19.7690750319), (25.3058082185, -21.0417613096))
            Line((25.3058082185, -21.0417613096), (25.2048074371, -21.0527795742))
            Line((25.2048074371, -21.0527795742), (25.0605893352, -19.7307800018))
            Line((25.0605893352, -19.7307800018), (25.570836504, -18.5027207374))
            Line((25.570836504, -18.5027207374), (25.6646602449, -18.5417036265))
        make_face()
        with BuildLine():
            ThreePointArc((-26.1636731936, -19.9484832976), (-25.8530143, -17.9310084007), (-26.3615698708, -15.9541206601))
            Line((-26.3615698708, -15.9541206601), (-26.2702654472, -15.909555402))
            Line((-26.2702654472, -15.909555402), (-25.2970482589, -17.9034636227))
            Line((-25.2970482589, -17.9034636227), (-26.0684108365, -19.9838052922))
            Line((-26.0684108365, -19.9838052922), (-26.1636731936, -19.9484832976))
        make_face()
        with BuildLine():
            ThreePointArc((-26.2692397475, -4.049882339), (-24.531015773, -0.7582243213), (-25.5037302423, 2.834860934))
            Line((-25.5037302423, 2.834860934), (-25.4222068107, 2.8954950011))
            ThreePointArc((-25.4222068107, 2.8954950011), (-23.1778893513, 2.0067211174), (-21.468388576, 0.0516595226))
            Line((-21.468388576, 0.0516595226), (-21.4896616404, -0.0770607984))
            Line((-21.4896616404, -0.0770607984), (-26.2030265059, -4.1269431374))
            Line((-26.2030265059, -4.1269431374), (-26.2692397475, -4.049882339))
        make_face()
        with BuildLine():
            ThreePointArc((16.3256234208, -36.9395775477), (16.6779484431, -34.0075867675), (15.3399155285, -31.3750270292))
            Line((15.3399155285, -31.3750270292), (15.4131973869, -31.3046542417))
            Line((15.4131973869, -31.3046542417), (17.8153497528, -33.8061068018))
            Line((17.8153497528, -33.8061068018), (16.4186194371, -36.9804957705))
            Line((16.4186194371, -36.9804957705), (16.3256234208, -36.9395775477))
        make_face()
    extrude(amount=F2_T11_DEPTH)

    # F3: fillet of radius 5.08 on 1 edges, made by hand

    # F3_s2 → F3_t1 (cut)
    with BuildSketch(Plane.XY.offset(-16.75782565)):
        with BuildLine():
            ThreePointArc((21.7041972204, -39.9499349296), (18.2013107758, -38.4208506374), (16.7558106694, -34.882653122))
            Line((16.7558106694, -34.882653122), (16.2478118633, -34.8837544504))
            ThreePointArc((16.2478118633, -34.8837544504), (15.8606433395, -36.7349864336), (14.5360868791, -39.7453438155))
            Line((14.5360868791, -39.7453438155), (15.0010669604, -40.4579349296))
            ThreePointArc((15.0010669604, -40.4579349296), (18.3526320904, -40.4579349296), (21.6910370693, -40.4577644388))
            Line((21.6910370693, -40.4577644388), (21.7041972204, -39.9499349296))
        make_face()
    extrude(amount=F3_T1_DEPTH, mode=Mode.SUBTRACT)


solid = f1.part
